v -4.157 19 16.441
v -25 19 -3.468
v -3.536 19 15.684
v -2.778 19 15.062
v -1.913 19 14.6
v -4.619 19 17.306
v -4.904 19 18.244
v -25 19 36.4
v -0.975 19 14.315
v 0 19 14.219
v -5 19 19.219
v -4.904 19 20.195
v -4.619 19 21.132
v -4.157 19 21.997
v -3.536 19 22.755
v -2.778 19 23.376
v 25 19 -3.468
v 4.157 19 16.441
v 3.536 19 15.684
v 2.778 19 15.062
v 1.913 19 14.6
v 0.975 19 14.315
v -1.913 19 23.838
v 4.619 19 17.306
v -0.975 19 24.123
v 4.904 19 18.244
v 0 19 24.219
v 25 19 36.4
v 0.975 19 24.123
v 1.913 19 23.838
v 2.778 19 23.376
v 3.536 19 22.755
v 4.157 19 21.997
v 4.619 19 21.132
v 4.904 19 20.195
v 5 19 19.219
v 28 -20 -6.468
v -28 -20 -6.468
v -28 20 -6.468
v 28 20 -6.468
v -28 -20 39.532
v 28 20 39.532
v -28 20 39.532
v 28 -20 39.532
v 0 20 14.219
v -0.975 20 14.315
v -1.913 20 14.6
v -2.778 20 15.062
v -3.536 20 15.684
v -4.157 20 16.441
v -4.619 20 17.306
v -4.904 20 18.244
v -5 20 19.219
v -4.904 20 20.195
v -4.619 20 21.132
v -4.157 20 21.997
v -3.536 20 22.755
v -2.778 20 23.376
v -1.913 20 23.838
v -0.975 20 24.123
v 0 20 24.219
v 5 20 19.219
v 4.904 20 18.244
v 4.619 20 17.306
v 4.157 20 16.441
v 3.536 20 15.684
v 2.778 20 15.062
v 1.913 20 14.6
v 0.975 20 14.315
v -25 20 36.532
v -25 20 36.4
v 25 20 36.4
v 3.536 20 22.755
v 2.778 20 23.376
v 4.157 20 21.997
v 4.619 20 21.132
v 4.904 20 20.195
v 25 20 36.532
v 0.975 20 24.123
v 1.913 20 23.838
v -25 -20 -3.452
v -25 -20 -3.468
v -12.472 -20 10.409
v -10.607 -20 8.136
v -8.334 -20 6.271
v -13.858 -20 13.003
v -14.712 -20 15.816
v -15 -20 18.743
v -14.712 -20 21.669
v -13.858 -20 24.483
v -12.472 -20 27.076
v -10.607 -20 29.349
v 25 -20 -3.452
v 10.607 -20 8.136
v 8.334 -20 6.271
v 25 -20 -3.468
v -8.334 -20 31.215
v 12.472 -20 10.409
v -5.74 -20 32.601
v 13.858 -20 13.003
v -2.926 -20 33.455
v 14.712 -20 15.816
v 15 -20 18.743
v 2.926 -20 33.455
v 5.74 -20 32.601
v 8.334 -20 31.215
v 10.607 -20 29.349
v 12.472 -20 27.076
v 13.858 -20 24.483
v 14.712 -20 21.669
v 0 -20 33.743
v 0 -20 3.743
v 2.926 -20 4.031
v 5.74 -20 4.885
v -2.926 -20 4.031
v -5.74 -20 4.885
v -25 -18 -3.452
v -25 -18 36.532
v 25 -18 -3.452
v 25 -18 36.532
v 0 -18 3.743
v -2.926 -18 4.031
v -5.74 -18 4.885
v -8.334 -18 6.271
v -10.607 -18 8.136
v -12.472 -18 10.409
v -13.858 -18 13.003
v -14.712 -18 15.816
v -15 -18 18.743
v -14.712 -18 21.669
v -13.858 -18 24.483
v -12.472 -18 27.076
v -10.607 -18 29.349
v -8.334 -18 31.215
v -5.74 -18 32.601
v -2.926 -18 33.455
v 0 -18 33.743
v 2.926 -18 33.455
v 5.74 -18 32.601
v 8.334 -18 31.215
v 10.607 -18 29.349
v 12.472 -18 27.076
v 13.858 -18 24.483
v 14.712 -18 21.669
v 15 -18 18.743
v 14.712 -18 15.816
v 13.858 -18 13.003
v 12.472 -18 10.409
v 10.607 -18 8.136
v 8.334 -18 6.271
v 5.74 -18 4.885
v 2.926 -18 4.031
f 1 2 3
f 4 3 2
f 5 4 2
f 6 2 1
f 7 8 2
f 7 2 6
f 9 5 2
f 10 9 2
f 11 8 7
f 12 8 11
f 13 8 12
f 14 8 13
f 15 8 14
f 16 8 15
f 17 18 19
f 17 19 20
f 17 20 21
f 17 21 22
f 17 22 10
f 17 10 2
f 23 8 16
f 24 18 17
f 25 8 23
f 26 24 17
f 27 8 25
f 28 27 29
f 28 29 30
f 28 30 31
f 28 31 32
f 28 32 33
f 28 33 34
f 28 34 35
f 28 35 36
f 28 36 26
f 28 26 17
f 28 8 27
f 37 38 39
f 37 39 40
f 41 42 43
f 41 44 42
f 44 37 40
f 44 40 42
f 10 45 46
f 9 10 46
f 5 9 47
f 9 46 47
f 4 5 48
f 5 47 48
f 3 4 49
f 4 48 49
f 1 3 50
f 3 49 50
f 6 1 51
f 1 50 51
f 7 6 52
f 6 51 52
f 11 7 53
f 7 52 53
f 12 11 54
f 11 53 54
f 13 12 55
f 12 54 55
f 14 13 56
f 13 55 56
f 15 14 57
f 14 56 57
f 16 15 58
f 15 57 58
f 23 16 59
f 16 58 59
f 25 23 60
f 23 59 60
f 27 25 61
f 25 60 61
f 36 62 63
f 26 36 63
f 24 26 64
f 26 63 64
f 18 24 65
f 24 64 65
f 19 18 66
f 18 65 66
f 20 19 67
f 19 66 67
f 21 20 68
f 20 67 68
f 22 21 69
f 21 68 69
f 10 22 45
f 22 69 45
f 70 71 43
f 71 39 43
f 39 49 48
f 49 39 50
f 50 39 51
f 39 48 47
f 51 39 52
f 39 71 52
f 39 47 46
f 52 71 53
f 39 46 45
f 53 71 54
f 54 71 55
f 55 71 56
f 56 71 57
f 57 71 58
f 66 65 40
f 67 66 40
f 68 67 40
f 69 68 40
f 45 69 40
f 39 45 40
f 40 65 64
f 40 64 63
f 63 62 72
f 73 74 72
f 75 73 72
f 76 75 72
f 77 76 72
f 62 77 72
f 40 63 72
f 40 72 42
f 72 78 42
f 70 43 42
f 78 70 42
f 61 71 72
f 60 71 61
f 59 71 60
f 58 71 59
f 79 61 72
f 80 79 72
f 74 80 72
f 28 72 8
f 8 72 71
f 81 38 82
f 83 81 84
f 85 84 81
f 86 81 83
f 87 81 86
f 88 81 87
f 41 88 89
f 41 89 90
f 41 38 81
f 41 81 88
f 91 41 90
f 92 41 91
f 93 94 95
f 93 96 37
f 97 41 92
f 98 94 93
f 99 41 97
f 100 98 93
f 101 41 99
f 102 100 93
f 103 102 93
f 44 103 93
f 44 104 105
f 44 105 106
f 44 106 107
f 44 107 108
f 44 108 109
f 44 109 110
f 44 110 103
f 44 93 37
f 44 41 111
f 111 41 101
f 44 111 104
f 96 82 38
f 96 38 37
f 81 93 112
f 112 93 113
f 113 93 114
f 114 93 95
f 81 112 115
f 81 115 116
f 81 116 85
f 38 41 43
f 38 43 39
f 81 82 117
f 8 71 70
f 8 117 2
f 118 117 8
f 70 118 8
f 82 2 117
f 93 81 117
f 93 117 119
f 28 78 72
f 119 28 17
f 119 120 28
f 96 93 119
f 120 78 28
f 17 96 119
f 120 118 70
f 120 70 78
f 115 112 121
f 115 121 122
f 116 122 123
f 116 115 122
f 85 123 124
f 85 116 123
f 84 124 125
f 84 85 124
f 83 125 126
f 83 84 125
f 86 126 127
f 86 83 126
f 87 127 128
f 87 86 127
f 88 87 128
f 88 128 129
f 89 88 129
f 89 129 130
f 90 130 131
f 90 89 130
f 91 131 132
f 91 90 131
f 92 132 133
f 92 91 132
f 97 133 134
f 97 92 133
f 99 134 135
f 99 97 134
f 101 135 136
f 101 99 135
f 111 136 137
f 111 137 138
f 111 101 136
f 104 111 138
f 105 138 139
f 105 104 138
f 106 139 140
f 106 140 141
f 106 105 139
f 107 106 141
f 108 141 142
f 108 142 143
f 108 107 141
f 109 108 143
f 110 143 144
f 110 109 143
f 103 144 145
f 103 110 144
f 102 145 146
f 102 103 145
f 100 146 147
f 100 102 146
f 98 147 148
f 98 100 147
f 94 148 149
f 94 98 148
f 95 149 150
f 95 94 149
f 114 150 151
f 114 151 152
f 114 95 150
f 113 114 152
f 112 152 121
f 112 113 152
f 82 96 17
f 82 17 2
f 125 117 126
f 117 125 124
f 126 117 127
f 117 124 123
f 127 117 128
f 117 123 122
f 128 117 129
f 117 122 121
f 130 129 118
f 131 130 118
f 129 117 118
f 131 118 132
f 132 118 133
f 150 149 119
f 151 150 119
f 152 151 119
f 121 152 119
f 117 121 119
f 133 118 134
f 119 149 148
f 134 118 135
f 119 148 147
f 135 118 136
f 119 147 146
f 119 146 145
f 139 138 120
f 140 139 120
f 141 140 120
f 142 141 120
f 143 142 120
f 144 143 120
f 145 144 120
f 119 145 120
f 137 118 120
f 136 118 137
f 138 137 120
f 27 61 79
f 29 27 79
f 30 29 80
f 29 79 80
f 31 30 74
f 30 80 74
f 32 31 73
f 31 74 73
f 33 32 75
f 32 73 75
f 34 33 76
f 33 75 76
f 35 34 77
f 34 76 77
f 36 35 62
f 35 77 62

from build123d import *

# Parameters (mm, degrees)
F1_DEPTH = 20
F5_DEPTH = 1
F7_DEPTH = 2


# Not quite as in the source:
# - a feature names something its author has since deleted; it is built from what else it names


with BuildPart() as f1:
    # F0 (on Front) → F1 (new body, symmetric)
    with BuildSketch(Plane.XZ):
        Polygon((-25, -3.4681803342), (-25, 36.5318196658), (25, 36.5318196658), (25, 26.5318196658), (28, 26.5318196658), (28, 39.5318196658), (-28, 39.5318196658), (-28, -6.4681803342), (0, -6.4681803342), (0, -3.4681803342), align=None)
        Polygon((28, 26.5318196658), (25, 26.5318196658), (25, -3.4681803342), (0, -3.4681803342), (0, -6.4681803342), (28, -6.4681803342), align=None)
    extrude(amount=F1_DEPTH, both=True)

    # F4 (on offset) → F5 (join)
    with BuildSketch(Plane.XZ.offset(-20)):
        Polygon((25, -3.5996623058), (25, 36.4003376942), (-25, 36.4003376942), (-25, -3.5996623058), (0, -3.5996623058), align=None)
        with BuildLine():
            ThreePointArc((5, 19.2190613598), (3.5355339059, 15.6835274538), (0, 14.2190613598))
            ThreePointArc((0, 14.2190613598), (-5, 19.2190613598), (0, 24.2190613598))
            ThreePointArc((0, 24.2190613598), (3.5355339059, 22.7545952657), (5, 19.2190613598))
        make_face(mode=Mode.SUBTRACT)
    extrude(amount=F5_DEPTH)

    # F6 (on offset) → F7 (join)
    with BuildSketch(Plane.XZ.offset(20)):
        Polygon((-25, 36.5481637139), (-25, -3.4518362861), (0, -3.4518362861), (25, -3.4518362861), (25, 36.5481637139), align=None)
        with BuildLine():
            ThreePointArc((15, 18.7427662313), (10.6066017178, 8.1361645135), (0, 3.7427662313))
            ThreePointArc((0, 3.7427662313), (-10.6066017178, 29.3493679491), (15, 18.7427662313))
        make_face(mode=Mode.SUBTRACT)
    extrude(amount=-F7_DEPTH)


solid = f1.part
